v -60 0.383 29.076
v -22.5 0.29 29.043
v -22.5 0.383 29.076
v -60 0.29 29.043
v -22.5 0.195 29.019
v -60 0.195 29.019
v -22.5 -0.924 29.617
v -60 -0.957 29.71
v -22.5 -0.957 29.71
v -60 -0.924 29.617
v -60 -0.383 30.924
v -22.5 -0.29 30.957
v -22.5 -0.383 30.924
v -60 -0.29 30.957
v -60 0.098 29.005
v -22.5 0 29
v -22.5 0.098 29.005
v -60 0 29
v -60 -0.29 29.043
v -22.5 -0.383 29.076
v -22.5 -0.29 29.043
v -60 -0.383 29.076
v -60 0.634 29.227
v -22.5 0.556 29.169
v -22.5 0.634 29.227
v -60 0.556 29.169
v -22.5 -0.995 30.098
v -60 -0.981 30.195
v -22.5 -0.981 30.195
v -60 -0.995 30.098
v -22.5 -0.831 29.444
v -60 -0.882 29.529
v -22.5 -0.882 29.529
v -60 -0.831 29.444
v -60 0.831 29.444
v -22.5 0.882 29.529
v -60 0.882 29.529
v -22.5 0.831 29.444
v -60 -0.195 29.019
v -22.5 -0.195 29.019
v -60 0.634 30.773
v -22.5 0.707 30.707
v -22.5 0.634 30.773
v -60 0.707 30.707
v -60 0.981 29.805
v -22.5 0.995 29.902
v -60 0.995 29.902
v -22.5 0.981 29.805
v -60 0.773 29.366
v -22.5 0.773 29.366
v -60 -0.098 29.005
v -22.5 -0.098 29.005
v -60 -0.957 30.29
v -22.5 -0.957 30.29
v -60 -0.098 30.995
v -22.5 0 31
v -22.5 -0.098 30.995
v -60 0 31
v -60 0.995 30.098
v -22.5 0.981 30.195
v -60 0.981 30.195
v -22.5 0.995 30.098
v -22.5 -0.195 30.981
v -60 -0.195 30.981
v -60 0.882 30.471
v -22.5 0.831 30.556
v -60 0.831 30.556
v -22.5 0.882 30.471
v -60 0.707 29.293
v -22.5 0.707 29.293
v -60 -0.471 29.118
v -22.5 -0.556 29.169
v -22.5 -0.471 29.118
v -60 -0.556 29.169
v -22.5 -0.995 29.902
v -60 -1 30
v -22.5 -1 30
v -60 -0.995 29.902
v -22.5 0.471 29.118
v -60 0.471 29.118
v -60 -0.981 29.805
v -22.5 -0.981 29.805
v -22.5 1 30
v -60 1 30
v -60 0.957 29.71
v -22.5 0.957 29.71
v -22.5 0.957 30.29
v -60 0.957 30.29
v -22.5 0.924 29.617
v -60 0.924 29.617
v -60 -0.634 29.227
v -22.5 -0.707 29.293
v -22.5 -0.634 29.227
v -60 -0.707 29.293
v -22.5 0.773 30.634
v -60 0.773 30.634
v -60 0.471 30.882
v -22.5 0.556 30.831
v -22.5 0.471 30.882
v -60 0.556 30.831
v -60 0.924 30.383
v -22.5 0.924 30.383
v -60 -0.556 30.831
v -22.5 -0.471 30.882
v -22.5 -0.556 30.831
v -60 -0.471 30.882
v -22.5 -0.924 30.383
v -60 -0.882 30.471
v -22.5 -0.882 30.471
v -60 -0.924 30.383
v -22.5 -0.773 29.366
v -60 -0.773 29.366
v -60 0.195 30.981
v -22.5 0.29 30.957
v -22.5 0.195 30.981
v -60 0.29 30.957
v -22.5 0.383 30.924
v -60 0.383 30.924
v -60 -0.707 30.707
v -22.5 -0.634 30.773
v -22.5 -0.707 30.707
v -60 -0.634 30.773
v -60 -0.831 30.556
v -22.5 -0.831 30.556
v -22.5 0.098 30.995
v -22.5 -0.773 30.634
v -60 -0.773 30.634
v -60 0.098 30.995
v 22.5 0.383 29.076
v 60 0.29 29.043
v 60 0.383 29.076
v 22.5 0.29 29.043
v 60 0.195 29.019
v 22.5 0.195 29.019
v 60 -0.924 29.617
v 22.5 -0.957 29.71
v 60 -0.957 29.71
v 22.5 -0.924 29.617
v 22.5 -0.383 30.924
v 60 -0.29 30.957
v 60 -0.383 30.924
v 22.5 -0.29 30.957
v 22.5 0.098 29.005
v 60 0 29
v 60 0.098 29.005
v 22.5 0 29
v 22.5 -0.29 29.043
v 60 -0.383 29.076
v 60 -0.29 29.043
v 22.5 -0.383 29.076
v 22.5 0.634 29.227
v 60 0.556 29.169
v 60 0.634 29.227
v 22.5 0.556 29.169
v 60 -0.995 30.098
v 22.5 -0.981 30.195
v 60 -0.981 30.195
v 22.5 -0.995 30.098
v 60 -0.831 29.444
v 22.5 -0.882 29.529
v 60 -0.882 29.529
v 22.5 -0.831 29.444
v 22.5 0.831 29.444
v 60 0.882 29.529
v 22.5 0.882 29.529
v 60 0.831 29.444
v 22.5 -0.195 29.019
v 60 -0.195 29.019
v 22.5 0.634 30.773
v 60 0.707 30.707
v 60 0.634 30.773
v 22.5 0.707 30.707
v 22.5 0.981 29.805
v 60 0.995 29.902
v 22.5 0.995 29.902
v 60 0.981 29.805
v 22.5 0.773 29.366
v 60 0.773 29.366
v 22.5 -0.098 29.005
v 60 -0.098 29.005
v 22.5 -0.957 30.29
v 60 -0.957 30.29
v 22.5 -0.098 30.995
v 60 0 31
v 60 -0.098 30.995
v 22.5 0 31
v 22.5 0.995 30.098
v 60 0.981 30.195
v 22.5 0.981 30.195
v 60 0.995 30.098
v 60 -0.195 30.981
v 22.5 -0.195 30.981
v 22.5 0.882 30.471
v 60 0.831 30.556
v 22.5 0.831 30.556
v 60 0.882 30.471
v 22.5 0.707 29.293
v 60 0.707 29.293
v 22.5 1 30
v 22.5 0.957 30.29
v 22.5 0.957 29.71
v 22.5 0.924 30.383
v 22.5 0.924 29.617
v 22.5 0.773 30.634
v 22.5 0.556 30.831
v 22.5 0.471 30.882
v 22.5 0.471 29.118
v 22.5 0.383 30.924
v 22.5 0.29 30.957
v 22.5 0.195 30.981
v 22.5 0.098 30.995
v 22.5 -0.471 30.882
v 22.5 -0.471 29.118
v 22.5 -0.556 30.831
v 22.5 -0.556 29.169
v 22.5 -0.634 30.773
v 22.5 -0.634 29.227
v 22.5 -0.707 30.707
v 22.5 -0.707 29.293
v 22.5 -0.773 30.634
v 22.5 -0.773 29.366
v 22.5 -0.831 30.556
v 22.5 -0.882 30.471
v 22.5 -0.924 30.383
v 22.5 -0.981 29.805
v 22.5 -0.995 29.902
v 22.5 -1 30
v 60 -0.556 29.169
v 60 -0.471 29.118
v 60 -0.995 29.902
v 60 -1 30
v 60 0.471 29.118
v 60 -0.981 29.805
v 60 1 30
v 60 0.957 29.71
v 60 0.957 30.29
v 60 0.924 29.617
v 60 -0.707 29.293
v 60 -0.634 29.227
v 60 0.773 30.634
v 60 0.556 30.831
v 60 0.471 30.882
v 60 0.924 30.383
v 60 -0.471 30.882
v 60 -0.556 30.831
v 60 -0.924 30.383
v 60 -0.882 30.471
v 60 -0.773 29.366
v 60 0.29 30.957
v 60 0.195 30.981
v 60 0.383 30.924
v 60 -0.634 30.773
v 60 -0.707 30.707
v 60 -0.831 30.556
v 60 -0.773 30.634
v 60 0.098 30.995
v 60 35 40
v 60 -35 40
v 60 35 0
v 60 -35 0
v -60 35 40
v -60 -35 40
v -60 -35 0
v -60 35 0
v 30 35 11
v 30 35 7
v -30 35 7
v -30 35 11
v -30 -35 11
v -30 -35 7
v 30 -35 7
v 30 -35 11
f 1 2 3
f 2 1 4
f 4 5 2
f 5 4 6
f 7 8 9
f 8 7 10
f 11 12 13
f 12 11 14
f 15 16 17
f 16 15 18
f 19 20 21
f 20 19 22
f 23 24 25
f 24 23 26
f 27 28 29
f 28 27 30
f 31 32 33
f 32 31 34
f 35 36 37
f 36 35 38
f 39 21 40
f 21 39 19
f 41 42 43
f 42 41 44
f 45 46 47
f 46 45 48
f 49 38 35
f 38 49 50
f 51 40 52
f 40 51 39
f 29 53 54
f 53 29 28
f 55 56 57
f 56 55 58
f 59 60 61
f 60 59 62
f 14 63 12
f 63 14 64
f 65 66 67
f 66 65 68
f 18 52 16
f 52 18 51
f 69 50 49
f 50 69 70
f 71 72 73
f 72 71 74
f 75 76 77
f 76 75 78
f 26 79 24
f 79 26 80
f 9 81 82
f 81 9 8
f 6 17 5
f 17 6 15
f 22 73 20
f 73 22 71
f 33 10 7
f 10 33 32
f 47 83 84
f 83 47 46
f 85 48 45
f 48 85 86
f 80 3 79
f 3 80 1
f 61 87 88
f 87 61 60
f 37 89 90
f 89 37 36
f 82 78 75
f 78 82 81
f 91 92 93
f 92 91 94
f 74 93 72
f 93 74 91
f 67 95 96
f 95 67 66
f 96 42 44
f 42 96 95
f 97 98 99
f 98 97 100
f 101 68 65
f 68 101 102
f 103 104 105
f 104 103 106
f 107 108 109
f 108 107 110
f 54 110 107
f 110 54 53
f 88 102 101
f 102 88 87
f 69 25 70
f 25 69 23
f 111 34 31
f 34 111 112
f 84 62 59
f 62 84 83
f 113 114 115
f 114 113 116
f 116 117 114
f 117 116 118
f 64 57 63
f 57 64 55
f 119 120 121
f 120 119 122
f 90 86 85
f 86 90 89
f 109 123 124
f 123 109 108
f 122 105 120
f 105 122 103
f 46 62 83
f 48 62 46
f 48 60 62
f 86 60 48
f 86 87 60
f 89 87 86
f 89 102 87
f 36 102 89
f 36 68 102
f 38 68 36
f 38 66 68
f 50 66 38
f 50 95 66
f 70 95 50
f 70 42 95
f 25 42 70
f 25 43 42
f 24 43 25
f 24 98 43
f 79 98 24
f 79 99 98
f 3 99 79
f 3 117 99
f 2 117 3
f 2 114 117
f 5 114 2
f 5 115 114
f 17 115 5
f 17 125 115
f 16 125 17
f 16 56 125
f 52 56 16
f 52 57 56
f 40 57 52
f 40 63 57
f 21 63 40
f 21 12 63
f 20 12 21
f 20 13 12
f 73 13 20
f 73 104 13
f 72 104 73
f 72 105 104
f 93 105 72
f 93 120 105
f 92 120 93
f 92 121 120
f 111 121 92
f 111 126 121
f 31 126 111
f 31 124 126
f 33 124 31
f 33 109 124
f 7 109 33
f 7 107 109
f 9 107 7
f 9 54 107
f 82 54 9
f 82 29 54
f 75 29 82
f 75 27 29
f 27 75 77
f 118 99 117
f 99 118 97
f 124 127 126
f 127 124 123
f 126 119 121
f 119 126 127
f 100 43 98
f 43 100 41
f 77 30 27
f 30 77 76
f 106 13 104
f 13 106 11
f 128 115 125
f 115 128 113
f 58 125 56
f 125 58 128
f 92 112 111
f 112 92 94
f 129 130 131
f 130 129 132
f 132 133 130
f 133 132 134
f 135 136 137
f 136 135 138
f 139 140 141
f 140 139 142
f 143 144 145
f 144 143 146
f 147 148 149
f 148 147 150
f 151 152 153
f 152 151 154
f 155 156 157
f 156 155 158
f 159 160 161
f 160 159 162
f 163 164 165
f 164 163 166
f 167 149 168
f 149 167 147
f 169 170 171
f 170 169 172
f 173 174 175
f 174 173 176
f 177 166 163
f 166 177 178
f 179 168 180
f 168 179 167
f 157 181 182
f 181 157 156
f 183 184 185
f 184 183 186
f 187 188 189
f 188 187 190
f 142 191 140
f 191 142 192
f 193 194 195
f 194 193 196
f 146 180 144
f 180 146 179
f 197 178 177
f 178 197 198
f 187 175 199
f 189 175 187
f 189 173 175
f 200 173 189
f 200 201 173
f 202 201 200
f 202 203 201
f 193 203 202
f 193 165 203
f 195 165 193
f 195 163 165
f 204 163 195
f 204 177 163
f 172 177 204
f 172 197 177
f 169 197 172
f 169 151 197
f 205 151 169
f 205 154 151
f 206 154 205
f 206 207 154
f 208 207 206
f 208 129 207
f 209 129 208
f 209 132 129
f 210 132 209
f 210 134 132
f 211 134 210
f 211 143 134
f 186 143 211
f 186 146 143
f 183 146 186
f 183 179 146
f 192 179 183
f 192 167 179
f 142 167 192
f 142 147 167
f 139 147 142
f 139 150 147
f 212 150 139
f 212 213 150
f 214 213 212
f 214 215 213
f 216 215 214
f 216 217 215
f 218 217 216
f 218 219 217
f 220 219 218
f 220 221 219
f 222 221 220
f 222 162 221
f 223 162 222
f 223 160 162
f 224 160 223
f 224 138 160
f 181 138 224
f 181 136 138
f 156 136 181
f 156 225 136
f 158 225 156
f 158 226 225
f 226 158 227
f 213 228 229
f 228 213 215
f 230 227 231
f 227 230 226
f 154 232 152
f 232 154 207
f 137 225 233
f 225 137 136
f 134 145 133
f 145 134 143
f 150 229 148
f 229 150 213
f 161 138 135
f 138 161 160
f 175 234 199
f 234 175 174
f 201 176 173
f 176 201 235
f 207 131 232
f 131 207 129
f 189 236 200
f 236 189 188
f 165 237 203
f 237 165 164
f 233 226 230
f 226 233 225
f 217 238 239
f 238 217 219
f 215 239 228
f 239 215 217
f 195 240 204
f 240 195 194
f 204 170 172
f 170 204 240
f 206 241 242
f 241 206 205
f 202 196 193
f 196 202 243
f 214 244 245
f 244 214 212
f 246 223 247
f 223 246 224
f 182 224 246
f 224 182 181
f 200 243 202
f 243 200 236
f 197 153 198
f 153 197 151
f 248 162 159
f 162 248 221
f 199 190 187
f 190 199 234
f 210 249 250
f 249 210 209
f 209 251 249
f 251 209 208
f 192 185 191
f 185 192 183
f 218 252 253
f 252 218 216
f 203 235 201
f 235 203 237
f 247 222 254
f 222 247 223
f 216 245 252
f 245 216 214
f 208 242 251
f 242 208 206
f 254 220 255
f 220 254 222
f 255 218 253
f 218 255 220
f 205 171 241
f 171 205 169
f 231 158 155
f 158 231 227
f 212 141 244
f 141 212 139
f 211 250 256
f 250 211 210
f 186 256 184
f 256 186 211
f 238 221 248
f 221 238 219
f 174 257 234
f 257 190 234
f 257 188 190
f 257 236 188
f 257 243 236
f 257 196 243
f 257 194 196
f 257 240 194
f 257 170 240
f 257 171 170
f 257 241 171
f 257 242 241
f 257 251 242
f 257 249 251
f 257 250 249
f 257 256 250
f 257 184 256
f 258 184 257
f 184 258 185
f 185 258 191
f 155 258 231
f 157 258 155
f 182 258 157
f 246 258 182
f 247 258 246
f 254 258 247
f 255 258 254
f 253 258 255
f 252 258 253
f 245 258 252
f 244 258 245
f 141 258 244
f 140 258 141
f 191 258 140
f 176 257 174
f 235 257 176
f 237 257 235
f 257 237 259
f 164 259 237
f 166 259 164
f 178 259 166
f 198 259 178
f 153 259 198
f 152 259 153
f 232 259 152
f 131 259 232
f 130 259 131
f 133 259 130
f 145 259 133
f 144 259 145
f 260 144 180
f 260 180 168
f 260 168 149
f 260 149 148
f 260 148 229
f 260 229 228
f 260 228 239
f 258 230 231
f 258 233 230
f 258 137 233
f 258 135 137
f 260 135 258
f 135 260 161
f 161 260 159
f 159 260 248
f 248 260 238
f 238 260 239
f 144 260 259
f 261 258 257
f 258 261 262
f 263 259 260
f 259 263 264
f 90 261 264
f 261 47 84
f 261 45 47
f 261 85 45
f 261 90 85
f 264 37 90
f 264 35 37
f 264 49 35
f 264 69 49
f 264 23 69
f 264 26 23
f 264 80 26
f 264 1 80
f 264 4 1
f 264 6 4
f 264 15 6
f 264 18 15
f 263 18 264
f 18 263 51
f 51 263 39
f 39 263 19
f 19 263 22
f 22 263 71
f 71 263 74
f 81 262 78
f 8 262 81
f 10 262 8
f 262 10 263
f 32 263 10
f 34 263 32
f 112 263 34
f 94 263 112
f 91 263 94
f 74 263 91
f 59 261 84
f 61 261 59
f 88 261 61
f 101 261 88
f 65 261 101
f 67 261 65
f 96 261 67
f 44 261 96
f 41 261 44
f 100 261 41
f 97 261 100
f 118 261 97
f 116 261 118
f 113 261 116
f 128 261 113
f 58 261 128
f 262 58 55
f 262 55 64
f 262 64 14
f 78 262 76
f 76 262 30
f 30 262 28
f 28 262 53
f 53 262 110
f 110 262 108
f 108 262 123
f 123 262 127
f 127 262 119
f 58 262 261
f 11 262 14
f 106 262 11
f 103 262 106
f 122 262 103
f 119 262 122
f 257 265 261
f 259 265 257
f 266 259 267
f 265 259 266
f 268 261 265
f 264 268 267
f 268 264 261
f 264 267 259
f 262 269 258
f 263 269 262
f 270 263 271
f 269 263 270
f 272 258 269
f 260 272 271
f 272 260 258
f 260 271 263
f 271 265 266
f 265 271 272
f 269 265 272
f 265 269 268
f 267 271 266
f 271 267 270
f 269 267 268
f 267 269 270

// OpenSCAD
// Mini horizontal gel-electrophoresis box - buffer tank
// Print orientation: tank rests on XY plane, open top facing +Z

$fn = 64;

// ---- Tank dimensions ----
tank_x      = 120;   // outer length (X)
tank_y      = 70;    // outer width (Y)
tank_h      = 40;    // outer height (Z)
wall        = 3;     // wall thickness
floor       = 3;     // floor thickness

// ---- Platform dimensions ----
plat_x      = 60;    // platform length in X (centred)
plat_top_z  = 10;    // platform top height above tank bottom

// ---- Hole dimensions ----
hole_d      = 2;     // electrode hole diameter
hole_y      = 0;     // hole centre Y
hole_z      = 30;    // hole centre Z

// ---- Derived ----
inner_h = tank_h - floor;   // inner floor to top (open)
eps     = 0.5;              // cutter overshoot

difference() {
    // Tank body
    translate([-tank_x/2, -tank_y/2, 0])
        cube([tank_x, tank_y, tank_h]);

    // Raised platform (solid, through walls)
    translate([-plat_x/2, -tank_y/2, plat_top_z - wall])
        cube([plat_x, tank_y, wall + 1]);

    // Horizontal electrode holes through end walls
    for (sx = [-1, 1])
        translate([sx * (tank_x/2 - hole_d), hole_y, hole_z])
            rotate([0, 90, 0])
                cylinder(d = hole_d, h = tank_y + 2*eps, center = true);
}
